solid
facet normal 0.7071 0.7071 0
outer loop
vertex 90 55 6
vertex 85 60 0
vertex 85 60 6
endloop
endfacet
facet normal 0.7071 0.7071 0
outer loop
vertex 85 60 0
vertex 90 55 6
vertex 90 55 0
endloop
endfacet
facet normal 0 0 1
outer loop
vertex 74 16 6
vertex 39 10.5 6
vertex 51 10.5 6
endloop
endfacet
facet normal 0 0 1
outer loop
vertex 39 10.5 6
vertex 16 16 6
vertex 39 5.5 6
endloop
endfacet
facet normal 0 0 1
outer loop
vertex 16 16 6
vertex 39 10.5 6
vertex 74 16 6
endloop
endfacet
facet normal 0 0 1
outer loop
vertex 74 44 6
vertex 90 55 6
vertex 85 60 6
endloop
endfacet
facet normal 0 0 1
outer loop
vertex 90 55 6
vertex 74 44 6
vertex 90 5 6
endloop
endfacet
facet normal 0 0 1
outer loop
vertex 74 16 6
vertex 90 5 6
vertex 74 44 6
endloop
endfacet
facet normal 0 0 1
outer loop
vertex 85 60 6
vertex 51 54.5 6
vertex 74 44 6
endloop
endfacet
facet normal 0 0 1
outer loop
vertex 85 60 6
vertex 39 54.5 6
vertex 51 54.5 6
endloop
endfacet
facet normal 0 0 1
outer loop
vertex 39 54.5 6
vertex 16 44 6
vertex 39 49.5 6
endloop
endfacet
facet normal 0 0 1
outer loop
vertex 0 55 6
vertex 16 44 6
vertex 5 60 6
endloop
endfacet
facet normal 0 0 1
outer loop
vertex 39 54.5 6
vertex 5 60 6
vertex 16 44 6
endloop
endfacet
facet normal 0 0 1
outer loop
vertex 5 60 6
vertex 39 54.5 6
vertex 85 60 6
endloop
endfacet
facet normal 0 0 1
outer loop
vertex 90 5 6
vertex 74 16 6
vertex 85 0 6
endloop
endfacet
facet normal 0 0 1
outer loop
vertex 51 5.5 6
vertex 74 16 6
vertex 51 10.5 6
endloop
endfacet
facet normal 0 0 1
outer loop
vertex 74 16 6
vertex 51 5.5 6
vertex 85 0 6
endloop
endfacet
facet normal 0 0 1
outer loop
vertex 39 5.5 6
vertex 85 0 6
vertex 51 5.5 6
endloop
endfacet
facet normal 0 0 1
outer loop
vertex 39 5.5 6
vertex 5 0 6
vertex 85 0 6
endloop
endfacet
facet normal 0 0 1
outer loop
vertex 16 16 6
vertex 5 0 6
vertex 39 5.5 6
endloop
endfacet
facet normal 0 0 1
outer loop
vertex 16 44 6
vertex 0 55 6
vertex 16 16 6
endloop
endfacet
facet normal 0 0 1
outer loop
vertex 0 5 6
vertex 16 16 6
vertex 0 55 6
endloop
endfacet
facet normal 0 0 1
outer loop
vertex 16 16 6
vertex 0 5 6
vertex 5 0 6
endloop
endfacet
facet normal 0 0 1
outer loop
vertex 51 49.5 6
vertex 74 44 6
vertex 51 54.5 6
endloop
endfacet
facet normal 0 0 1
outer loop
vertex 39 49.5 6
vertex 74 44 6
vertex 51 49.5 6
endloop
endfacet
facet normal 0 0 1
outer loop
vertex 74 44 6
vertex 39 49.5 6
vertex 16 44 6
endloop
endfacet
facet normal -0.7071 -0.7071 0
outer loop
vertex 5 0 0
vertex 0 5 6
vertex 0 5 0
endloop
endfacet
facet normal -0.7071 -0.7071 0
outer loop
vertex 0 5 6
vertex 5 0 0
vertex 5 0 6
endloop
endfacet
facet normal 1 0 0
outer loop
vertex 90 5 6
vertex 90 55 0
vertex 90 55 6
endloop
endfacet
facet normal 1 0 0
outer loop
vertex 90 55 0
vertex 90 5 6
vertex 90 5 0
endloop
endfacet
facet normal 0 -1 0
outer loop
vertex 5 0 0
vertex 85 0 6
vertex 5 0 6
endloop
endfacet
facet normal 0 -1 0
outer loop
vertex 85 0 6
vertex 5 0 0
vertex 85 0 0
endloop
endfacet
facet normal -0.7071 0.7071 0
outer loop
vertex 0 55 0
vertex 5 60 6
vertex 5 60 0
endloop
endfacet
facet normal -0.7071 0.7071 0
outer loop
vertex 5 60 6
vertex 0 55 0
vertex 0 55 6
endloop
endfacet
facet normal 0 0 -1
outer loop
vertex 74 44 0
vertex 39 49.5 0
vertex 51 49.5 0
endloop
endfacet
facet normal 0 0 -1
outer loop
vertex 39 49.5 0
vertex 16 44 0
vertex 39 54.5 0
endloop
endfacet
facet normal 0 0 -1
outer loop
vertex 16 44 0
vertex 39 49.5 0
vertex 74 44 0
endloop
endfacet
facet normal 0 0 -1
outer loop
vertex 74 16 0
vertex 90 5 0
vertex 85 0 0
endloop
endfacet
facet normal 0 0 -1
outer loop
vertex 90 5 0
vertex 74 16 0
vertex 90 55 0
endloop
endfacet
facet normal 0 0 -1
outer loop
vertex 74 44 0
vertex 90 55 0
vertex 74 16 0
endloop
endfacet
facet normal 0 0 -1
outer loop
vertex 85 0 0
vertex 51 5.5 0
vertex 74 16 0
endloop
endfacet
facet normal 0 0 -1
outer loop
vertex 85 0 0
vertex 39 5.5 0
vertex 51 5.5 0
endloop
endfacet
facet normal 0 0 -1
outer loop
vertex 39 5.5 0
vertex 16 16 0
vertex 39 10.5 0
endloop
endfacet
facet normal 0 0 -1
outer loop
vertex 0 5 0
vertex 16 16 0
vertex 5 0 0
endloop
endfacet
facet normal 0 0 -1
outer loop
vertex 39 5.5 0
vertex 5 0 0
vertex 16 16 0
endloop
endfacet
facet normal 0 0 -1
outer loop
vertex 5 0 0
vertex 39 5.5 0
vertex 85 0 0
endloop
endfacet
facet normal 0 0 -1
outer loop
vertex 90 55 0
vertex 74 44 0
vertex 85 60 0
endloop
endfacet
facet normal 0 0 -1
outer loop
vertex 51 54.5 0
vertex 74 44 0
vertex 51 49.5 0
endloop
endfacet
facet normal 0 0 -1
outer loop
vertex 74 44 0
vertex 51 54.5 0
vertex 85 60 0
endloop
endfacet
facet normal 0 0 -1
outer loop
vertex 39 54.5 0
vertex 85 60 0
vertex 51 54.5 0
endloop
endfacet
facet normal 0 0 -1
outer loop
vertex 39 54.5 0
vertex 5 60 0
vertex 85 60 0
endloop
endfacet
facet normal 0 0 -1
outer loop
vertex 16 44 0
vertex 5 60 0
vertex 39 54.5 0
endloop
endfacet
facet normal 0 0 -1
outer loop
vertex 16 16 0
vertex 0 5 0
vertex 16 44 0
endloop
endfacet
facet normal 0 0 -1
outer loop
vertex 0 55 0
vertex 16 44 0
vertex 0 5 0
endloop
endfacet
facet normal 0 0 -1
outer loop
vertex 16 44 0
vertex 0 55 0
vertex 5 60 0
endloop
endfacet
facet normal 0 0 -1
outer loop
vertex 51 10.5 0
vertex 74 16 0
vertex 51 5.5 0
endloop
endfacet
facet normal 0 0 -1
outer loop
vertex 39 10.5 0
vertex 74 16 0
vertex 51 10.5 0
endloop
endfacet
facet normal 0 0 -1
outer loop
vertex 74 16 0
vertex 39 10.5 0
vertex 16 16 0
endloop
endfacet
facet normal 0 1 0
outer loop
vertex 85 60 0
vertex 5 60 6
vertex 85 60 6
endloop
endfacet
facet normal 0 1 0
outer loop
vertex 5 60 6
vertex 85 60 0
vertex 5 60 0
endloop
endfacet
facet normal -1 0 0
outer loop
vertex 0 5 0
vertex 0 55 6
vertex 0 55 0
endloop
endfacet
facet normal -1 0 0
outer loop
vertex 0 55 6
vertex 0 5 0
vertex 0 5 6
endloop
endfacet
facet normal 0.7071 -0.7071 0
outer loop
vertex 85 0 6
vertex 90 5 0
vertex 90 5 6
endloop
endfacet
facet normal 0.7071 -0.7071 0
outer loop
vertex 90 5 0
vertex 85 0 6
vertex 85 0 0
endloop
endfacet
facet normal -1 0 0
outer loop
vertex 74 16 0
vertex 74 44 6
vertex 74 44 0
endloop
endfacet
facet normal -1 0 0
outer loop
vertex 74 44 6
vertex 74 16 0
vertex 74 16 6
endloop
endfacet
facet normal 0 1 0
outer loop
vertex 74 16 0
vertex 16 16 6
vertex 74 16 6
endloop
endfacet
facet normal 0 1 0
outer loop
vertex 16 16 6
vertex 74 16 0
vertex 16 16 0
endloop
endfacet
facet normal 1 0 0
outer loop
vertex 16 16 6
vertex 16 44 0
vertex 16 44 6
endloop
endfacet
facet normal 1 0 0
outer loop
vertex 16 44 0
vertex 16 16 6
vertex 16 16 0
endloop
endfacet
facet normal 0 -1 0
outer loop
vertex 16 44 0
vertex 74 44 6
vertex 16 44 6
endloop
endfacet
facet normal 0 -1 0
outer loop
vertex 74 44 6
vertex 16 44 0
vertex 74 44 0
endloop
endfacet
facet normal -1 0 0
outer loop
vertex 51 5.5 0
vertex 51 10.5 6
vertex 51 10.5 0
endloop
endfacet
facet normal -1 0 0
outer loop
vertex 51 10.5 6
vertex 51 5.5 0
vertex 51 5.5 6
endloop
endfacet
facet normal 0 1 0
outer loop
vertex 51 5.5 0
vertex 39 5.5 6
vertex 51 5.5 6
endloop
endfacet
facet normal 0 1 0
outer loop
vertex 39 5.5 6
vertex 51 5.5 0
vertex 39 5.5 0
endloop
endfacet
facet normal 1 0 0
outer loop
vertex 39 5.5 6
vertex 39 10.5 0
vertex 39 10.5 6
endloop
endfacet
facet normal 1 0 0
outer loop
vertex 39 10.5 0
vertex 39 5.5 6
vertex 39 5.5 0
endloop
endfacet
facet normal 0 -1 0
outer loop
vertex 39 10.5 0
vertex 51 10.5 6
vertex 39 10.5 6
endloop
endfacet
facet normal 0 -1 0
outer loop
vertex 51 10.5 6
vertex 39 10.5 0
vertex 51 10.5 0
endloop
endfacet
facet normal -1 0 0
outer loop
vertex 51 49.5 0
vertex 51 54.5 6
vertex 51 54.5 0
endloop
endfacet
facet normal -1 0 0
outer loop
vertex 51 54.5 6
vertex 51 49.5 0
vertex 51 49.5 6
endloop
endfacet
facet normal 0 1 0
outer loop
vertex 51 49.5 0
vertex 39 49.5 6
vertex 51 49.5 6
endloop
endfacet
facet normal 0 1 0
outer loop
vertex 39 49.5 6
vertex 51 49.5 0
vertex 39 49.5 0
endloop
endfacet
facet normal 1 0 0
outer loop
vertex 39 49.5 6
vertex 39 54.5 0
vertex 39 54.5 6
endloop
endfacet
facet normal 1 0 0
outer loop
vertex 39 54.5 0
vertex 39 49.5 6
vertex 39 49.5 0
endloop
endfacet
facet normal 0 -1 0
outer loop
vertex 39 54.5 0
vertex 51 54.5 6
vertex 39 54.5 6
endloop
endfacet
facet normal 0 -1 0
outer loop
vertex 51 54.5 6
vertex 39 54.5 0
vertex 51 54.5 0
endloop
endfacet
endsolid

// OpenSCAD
$fn = 32;

// ----------------------------------------------------------------------
// Frame plate: 90 x 60 frame, 16 mm rails
// ----------------------------------------------------------------------

// --- parameters (mm) ---
plate_l = 90;             // plate length, X
plate_w = 60;             // plate width, Y
plate_t = 6;              // plate thickness, Z (extrusion height)
corner_c = 5;             // corner chamfer
frame_bar = 16;           // frame rail width
slot_l = 12;              // adjustment slot length
slot_w = 5;               // adjustment slot width

win_l = plate_l - 2 * frame_bar;  // window length
win_w = plate_w - 2 * frame_bar;  // window width

profile = [[5, 0], [85, 0], [90, 5], [90, 55], [85, 60], [5, 60], [0, 55], [0, 5]];  // primary outline, 8 points, counter clockwise
void_1 = [[16, 16], [74, 16], [74, 44], [16, 44]];  // the window, 4 points
void_2 = [[39, 5.5], [51, 5.5], [51, 10.5], [39, 10.5]];  // adjustment slot, 4 points
void_3 = [[39, 49.5], [51, 49.5], [51, 54.5], [39, 54.5]];  // adjustment slot, 4 points

// --- the one profile operation ---
difference() {
  linear_extrude(height = plate_t) polygon(points = profile);
  translate([0, 0, -1])
    linear_extrude(height = plate_t + 2) polygon(points = void_1);
  translate([0, 0, -1])
    linear_extrude(height = plate_t + 2) polygon(points = void_2);
  translate([0, 0, -1])
    linear_extrude(height = plate_t + 2) polygon(points = void_3);
}
